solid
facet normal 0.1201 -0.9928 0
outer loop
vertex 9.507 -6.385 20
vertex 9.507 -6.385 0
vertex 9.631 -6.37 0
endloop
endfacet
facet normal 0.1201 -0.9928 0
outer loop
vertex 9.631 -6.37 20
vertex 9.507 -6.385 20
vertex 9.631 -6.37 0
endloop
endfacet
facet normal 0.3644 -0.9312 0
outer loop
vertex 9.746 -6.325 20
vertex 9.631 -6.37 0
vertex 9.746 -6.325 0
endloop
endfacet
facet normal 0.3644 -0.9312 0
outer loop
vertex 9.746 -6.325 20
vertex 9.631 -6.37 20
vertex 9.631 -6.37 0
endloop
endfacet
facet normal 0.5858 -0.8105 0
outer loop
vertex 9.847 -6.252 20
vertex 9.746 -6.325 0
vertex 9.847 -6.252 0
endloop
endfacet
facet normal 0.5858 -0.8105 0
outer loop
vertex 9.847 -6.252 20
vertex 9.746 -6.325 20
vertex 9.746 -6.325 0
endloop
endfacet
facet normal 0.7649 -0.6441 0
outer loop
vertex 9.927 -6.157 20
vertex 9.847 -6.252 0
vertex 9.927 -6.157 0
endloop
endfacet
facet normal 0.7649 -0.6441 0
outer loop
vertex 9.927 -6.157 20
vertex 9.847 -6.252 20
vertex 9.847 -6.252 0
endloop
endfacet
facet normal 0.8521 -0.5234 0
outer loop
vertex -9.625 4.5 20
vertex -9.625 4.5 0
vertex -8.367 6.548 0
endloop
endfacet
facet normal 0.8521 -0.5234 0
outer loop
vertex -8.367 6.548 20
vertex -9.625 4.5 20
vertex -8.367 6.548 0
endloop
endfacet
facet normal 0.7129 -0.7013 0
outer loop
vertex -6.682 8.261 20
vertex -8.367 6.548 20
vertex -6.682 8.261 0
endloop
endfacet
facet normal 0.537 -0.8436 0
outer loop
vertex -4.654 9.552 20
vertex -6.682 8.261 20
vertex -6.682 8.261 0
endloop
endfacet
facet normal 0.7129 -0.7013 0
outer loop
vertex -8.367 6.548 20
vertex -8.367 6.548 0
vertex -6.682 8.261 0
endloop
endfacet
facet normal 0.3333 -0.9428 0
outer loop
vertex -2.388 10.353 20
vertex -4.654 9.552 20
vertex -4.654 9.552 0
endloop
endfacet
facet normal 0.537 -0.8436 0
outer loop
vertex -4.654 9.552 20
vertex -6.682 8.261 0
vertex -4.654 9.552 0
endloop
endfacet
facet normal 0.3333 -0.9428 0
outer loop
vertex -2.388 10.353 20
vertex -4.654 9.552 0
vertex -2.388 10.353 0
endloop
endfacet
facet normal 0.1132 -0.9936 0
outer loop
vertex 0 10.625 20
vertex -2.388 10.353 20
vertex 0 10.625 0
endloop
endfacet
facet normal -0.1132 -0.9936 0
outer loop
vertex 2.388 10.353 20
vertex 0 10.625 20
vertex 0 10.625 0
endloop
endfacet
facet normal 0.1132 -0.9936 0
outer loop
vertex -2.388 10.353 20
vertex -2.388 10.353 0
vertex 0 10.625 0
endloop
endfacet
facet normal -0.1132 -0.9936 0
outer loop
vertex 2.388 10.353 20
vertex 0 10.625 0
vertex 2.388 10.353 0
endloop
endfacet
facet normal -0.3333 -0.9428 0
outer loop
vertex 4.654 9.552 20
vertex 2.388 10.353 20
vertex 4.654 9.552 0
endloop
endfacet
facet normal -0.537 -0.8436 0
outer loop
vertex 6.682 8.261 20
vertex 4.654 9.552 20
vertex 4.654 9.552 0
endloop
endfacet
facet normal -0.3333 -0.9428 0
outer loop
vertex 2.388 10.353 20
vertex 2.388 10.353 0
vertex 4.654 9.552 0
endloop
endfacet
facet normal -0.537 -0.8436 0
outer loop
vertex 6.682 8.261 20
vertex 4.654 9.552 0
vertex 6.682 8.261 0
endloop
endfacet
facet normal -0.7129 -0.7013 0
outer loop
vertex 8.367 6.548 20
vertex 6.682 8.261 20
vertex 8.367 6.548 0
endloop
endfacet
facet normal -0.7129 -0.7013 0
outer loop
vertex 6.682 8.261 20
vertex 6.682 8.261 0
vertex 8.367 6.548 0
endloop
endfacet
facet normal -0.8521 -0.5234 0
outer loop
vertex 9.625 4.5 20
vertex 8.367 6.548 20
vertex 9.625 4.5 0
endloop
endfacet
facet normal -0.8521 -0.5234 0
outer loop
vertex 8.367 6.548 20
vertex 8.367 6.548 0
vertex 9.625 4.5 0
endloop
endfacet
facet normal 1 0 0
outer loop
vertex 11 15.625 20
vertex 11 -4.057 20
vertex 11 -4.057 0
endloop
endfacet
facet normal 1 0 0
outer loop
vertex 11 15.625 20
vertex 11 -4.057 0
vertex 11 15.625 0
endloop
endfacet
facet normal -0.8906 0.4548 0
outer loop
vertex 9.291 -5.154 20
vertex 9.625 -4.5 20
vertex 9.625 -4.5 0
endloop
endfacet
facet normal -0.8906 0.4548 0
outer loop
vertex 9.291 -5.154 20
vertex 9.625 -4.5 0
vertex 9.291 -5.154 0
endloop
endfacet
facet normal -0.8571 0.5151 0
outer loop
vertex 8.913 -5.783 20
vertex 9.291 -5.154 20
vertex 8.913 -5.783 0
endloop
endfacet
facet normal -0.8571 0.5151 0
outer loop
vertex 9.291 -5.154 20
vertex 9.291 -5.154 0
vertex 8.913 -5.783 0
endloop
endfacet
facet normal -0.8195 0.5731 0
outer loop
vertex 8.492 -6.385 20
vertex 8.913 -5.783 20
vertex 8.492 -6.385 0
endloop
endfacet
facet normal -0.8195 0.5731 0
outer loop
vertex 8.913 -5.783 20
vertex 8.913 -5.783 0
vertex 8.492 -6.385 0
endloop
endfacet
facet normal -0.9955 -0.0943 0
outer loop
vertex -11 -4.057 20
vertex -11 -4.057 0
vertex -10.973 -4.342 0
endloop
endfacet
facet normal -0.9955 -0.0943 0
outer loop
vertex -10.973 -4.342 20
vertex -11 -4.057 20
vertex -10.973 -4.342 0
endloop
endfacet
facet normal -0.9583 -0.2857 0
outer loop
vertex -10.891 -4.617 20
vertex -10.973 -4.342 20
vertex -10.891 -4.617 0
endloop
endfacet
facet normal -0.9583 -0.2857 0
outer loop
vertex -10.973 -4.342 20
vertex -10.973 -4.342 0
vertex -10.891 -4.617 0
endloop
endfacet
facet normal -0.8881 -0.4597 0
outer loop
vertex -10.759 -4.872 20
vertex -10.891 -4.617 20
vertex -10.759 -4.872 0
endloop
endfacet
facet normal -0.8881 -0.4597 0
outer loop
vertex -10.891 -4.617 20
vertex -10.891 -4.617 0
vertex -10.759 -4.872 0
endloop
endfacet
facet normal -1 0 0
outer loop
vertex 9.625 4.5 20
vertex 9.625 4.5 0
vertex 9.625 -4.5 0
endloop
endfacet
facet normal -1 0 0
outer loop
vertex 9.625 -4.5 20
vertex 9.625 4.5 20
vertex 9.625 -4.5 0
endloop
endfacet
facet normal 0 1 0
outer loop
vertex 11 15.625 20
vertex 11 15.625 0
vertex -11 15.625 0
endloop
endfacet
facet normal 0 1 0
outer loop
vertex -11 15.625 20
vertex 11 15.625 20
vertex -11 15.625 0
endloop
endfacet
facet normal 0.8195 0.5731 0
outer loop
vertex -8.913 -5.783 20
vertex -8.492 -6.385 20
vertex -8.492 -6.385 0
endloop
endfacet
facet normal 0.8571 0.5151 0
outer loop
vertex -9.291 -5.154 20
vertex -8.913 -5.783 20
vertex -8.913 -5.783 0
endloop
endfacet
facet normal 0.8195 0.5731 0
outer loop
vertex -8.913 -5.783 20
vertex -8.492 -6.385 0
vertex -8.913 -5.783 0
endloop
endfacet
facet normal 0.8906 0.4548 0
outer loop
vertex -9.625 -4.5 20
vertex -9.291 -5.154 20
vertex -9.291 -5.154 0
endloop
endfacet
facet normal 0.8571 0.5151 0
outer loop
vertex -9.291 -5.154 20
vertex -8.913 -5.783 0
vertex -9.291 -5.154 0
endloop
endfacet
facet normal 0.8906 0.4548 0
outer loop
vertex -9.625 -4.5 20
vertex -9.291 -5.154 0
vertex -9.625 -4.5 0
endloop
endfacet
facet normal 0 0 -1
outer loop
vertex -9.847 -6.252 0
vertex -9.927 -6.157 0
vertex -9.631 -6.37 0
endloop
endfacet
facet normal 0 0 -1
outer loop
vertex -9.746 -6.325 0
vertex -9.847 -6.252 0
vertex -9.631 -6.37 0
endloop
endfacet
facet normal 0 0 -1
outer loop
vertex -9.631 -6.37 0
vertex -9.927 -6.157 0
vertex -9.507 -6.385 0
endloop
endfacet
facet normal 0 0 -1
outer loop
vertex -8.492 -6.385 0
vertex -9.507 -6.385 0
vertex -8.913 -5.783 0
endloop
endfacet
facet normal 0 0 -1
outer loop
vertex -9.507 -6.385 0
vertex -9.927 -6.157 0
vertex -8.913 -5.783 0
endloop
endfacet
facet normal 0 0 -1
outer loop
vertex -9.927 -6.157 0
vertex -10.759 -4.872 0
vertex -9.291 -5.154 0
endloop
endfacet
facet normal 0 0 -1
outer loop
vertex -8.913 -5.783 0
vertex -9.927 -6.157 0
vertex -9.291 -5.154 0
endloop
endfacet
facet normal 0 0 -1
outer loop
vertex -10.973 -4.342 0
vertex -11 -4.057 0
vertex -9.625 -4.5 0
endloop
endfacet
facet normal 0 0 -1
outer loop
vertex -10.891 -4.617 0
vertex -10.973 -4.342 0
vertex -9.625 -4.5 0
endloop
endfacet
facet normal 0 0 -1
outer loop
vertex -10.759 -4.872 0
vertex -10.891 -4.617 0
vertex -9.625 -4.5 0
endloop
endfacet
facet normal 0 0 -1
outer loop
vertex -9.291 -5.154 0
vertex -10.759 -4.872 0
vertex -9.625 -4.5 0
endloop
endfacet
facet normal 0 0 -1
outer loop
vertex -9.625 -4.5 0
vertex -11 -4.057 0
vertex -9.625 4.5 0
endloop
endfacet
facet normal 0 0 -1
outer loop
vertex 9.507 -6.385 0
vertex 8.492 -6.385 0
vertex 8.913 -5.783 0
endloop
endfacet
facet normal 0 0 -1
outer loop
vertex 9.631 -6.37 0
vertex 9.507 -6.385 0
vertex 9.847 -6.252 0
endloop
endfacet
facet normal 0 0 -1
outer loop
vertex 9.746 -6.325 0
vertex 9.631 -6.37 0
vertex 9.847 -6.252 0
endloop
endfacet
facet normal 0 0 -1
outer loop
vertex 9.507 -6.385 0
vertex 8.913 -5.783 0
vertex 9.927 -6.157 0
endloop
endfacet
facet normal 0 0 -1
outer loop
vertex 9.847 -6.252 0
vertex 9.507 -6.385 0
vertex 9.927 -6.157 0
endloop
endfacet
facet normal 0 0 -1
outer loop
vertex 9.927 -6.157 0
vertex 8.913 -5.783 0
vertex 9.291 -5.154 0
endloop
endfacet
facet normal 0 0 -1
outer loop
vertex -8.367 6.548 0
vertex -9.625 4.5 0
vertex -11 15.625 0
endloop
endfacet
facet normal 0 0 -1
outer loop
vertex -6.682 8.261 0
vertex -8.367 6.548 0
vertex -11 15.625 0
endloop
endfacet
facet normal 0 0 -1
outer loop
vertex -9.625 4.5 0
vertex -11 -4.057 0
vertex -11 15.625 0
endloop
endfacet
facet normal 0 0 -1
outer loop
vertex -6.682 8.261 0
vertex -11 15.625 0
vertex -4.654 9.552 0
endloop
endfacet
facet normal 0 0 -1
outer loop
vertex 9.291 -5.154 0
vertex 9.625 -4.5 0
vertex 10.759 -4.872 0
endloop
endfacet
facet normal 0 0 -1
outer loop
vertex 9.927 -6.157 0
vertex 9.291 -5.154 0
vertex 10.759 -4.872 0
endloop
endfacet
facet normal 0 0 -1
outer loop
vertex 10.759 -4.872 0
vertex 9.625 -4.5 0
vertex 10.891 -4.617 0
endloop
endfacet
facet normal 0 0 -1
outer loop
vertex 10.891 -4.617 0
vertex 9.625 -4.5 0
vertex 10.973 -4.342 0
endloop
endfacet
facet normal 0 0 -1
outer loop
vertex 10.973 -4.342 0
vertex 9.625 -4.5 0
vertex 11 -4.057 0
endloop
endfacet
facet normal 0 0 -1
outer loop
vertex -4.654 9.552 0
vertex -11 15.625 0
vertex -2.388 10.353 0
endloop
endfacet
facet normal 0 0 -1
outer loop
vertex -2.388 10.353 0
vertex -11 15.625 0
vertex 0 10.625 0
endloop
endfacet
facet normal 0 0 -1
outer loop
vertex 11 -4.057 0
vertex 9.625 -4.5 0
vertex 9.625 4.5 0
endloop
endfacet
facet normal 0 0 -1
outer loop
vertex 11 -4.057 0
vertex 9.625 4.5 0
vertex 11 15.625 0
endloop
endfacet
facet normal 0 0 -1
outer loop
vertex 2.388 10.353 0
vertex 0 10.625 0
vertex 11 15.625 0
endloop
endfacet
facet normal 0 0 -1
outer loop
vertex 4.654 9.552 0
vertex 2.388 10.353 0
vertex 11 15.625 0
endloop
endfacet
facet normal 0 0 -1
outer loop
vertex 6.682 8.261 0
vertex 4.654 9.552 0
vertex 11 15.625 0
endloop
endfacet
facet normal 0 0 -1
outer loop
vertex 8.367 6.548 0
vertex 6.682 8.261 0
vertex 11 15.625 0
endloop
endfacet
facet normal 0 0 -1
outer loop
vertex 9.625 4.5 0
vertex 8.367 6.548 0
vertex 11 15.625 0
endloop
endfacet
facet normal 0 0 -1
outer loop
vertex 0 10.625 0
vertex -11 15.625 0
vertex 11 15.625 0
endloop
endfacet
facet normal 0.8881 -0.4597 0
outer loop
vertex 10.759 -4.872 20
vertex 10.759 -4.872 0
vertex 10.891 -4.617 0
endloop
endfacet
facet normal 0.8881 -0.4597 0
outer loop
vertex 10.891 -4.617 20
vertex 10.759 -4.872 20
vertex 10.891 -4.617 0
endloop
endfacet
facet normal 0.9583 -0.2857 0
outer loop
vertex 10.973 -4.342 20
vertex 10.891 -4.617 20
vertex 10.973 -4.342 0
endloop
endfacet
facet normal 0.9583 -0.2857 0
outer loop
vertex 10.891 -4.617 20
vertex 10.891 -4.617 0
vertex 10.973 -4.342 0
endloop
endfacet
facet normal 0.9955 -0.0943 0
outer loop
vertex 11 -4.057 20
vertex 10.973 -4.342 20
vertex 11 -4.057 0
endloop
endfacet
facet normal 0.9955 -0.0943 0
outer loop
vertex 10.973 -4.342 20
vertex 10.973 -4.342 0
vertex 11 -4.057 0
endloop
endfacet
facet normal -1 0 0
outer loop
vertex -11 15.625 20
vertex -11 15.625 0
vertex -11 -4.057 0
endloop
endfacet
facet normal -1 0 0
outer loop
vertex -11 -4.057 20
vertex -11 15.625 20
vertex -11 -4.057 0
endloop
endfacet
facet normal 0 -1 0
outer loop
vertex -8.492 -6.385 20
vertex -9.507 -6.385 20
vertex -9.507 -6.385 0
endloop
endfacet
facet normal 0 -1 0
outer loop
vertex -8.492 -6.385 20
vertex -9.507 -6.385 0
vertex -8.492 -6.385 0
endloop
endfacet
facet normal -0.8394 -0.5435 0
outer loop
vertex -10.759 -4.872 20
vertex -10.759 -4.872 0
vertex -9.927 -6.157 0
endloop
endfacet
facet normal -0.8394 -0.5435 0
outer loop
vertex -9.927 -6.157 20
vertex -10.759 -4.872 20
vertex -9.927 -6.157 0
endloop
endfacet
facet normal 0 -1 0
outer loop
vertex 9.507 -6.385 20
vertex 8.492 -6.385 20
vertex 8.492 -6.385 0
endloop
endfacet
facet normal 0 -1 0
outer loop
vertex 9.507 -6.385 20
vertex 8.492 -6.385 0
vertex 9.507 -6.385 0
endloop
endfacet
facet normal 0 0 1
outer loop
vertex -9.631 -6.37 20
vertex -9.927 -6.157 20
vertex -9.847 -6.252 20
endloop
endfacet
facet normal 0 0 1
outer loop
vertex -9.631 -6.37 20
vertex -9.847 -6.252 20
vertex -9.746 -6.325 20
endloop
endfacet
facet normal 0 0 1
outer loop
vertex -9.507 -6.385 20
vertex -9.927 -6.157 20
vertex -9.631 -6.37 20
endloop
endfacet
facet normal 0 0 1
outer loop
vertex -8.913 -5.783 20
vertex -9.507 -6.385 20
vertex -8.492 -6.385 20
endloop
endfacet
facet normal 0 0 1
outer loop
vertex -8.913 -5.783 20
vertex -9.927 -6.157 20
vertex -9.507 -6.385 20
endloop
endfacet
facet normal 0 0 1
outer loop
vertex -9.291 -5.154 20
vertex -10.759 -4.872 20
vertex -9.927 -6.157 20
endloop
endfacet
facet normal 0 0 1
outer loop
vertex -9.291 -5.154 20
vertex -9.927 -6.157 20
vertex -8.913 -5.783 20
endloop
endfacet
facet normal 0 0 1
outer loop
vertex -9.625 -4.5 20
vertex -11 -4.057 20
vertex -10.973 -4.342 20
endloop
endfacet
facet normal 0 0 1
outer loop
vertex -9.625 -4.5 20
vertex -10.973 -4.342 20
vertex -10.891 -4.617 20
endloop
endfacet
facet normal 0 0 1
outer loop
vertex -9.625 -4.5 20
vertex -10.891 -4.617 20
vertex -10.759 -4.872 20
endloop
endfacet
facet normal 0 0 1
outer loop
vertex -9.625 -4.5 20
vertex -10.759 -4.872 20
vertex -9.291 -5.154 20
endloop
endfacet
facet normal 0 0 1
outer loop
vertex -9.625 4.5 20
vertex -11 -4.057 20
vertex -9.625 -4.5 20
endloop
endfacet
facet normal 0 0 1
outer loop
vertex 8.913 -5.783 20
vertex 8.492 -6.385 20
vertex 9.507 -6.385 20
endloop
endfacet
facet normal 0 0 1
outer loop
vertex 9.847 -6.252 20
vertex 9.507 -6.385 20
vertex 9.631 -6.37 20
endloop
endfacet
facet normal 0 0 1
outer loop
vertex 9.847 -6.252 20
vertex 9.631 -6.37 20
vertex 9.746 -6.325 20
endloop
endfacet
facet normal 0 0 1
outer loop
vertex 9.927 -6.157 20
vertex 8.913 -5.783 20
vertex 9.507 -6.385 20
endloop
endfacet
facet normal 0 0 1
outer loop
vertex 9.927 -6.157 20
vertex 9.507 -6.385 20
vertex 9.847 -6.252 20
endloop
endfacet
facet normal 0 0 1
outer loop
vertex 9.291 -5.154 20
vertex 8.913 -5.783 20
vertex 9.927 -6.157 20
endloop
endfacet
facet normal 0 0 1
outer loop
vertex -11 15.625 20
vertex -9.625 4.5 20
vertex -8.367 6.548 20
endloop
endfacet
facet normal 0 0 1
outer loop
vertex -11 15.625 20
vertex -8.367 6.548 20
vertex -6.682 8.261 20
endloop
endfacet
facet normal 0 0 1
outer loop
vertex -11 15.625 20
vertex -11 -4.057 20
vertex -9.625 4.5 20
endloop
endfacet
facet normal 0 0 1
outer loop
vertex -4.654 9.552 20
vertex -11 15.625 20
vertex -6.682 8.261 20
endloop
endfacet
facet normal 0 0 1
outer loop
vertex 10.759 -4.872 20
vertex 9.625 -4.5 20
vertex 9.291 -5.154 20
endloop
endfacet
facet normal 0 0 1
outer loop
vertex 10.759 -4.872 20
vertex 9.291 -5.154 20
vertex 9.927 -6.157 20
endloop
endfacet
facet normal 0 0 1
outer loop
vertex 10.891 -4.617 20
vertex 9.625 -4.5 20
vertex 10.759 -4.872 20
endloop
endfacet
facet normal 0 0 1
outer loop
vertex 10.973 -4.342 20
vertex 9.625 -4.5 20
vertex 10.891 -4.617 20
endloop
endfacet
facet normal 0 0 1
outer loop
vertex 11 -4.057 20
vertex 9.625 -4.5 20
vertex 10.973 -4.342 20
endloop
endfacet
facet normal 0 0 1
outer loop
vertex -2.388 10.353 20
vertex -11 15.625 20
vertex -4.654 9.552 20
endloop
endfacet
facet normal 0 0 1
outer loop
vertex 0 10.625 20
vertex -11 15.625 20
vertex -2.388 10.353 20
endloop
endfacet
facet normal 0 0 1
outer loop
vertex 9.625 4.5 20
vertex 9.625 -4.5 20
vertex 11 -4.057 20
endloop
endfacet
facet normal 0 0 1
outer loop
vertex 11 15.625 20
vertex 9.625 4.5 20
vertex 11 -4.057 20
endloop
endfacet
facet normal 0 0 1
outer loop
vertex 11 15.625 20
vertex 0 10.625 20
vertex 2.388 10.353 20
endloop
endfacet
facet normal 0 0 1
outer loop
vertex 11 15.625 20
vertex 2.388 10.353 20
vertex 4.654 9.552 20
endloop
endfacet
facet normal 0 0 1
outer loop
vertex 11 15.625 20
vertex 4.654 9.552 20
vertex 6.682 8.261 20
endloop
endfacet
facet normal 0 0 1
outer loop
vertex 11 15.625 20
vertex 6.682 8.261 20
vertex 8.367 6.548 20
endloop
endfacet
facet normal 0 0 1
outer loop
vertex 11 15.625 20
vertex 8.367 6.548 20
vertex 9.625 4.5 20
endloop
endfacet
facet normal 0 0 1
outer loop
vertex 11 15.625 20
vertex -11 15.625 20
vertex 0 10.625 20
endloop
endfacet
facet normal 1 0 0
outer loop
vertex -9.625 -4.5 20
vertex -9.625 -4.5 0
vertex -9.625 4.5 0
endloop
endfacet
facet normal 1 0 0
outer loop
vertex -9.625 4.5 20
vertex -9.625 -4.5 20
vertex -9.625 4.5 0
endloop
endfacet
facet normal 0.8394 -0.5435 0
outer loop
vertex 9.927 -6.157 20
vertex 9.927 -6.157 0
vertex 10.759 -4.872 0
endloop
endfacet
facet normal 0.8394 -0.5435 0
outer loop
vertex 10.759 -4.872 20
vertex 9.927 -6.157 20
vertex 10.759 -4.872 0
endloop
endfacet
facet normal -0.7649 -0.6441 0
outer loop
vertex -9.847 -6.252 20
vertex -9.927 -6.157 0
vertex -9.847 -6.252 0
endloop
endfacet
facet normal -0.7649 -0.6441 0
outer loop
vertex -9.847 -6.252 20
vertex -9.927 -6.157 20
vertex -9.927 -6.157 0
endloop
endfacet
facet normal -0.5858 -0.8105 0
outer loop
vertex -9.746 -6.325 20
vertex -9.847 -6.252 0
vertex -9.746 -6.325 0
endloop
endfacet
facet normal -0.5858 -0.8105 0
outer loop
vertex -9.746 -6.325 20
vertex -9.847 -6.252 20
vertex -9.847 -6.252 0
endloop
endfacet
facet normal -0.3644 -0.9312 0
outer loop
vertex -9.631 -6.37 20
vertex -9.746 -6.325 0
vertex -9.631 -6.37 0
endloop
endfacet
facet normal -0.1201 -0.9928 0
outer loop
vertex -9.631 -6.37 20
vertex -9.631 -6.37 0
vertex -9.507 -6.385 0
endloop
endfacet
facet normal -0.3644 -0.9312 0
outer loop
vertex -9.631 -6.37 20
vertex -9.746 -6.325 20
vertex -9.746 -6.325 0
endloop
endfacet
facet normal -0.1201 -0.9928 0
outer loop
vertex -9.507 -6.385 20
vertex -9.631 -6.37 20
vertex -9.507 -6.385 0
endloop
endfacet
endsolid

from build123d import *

# Parameters (mm, degrees)
F1_DEPTH = 20
F2_R     = 0.5


with BuildPart() as f1:
    # F0 (on Top) → F1 (new body)
    with BuildSketch(Plane.XY):
        with BuildLine():
            ThreePointArc((9.625, -4.5), (9.107562, -5.472014), (8.492301, -6.385253))
            Line((8.492301, -6.385253), (9.779271, -6.385253))
            Line((9.779271, -6.385253), (10.759093, -4.872048))
            ThreePointArc((10.759093, -4.872048), (10.938513, -4.481831), (11, -4.056767))
            Line((11, -4.056767), (11, 15.625))
            Line((11, 15.625), (-11, 15.625))
            Line((-11, 15.625), (-11, -4.056767))
            ThreePointArc((-11, -4.056767), (-10.938513, -4.481831), (-10.759093, -4.872048))
            Line((-10.759093, -4.872048), (-9.779271, -6.385253))
            Line((-9.779271, -6.385253), (-8.492301, -6.385253))
            ThreePointArc((-8.492301, -6.385253), (-9.107562, -5.472014), (-9.625, -4.5))
            ThreePointArc((-9.625, -4.5), (-10.625, 0), (-9.625, 4.5))
            ThreePointArc((-9.625, 4.5), (0, 10.625), (9.625, 4.5))
            ThreePointArc((9.625, 4.5), (10.625, 0), (9.625, -4.5))
        make_face()
        with BuildLine():
            Line((-9.625, -4.5), (-9.625, 4.5))
            ThreePointArc((-9.625, 4.5), (-10.625, 0), (-9.625, -4.5))
        make_face()
        with BuildLine():
            Line((9.625, 4.5), (9.625, -4.5))
            ThreePointArc((9.625, -4.5), (10.625, 0), (9.625, 4.5))
        make_face()
    extrude(amount=F1_DEPTH)

    # F2
    f2_edges = [f1.edges().sort_by_distance(p)[0] for p in [
        (-9.779271, -6.385253, 10),
        (9.779271, -6.385253, 10),
    ]]
    fillet(f2_edges, radius=F2_R)


solid = f1.part
